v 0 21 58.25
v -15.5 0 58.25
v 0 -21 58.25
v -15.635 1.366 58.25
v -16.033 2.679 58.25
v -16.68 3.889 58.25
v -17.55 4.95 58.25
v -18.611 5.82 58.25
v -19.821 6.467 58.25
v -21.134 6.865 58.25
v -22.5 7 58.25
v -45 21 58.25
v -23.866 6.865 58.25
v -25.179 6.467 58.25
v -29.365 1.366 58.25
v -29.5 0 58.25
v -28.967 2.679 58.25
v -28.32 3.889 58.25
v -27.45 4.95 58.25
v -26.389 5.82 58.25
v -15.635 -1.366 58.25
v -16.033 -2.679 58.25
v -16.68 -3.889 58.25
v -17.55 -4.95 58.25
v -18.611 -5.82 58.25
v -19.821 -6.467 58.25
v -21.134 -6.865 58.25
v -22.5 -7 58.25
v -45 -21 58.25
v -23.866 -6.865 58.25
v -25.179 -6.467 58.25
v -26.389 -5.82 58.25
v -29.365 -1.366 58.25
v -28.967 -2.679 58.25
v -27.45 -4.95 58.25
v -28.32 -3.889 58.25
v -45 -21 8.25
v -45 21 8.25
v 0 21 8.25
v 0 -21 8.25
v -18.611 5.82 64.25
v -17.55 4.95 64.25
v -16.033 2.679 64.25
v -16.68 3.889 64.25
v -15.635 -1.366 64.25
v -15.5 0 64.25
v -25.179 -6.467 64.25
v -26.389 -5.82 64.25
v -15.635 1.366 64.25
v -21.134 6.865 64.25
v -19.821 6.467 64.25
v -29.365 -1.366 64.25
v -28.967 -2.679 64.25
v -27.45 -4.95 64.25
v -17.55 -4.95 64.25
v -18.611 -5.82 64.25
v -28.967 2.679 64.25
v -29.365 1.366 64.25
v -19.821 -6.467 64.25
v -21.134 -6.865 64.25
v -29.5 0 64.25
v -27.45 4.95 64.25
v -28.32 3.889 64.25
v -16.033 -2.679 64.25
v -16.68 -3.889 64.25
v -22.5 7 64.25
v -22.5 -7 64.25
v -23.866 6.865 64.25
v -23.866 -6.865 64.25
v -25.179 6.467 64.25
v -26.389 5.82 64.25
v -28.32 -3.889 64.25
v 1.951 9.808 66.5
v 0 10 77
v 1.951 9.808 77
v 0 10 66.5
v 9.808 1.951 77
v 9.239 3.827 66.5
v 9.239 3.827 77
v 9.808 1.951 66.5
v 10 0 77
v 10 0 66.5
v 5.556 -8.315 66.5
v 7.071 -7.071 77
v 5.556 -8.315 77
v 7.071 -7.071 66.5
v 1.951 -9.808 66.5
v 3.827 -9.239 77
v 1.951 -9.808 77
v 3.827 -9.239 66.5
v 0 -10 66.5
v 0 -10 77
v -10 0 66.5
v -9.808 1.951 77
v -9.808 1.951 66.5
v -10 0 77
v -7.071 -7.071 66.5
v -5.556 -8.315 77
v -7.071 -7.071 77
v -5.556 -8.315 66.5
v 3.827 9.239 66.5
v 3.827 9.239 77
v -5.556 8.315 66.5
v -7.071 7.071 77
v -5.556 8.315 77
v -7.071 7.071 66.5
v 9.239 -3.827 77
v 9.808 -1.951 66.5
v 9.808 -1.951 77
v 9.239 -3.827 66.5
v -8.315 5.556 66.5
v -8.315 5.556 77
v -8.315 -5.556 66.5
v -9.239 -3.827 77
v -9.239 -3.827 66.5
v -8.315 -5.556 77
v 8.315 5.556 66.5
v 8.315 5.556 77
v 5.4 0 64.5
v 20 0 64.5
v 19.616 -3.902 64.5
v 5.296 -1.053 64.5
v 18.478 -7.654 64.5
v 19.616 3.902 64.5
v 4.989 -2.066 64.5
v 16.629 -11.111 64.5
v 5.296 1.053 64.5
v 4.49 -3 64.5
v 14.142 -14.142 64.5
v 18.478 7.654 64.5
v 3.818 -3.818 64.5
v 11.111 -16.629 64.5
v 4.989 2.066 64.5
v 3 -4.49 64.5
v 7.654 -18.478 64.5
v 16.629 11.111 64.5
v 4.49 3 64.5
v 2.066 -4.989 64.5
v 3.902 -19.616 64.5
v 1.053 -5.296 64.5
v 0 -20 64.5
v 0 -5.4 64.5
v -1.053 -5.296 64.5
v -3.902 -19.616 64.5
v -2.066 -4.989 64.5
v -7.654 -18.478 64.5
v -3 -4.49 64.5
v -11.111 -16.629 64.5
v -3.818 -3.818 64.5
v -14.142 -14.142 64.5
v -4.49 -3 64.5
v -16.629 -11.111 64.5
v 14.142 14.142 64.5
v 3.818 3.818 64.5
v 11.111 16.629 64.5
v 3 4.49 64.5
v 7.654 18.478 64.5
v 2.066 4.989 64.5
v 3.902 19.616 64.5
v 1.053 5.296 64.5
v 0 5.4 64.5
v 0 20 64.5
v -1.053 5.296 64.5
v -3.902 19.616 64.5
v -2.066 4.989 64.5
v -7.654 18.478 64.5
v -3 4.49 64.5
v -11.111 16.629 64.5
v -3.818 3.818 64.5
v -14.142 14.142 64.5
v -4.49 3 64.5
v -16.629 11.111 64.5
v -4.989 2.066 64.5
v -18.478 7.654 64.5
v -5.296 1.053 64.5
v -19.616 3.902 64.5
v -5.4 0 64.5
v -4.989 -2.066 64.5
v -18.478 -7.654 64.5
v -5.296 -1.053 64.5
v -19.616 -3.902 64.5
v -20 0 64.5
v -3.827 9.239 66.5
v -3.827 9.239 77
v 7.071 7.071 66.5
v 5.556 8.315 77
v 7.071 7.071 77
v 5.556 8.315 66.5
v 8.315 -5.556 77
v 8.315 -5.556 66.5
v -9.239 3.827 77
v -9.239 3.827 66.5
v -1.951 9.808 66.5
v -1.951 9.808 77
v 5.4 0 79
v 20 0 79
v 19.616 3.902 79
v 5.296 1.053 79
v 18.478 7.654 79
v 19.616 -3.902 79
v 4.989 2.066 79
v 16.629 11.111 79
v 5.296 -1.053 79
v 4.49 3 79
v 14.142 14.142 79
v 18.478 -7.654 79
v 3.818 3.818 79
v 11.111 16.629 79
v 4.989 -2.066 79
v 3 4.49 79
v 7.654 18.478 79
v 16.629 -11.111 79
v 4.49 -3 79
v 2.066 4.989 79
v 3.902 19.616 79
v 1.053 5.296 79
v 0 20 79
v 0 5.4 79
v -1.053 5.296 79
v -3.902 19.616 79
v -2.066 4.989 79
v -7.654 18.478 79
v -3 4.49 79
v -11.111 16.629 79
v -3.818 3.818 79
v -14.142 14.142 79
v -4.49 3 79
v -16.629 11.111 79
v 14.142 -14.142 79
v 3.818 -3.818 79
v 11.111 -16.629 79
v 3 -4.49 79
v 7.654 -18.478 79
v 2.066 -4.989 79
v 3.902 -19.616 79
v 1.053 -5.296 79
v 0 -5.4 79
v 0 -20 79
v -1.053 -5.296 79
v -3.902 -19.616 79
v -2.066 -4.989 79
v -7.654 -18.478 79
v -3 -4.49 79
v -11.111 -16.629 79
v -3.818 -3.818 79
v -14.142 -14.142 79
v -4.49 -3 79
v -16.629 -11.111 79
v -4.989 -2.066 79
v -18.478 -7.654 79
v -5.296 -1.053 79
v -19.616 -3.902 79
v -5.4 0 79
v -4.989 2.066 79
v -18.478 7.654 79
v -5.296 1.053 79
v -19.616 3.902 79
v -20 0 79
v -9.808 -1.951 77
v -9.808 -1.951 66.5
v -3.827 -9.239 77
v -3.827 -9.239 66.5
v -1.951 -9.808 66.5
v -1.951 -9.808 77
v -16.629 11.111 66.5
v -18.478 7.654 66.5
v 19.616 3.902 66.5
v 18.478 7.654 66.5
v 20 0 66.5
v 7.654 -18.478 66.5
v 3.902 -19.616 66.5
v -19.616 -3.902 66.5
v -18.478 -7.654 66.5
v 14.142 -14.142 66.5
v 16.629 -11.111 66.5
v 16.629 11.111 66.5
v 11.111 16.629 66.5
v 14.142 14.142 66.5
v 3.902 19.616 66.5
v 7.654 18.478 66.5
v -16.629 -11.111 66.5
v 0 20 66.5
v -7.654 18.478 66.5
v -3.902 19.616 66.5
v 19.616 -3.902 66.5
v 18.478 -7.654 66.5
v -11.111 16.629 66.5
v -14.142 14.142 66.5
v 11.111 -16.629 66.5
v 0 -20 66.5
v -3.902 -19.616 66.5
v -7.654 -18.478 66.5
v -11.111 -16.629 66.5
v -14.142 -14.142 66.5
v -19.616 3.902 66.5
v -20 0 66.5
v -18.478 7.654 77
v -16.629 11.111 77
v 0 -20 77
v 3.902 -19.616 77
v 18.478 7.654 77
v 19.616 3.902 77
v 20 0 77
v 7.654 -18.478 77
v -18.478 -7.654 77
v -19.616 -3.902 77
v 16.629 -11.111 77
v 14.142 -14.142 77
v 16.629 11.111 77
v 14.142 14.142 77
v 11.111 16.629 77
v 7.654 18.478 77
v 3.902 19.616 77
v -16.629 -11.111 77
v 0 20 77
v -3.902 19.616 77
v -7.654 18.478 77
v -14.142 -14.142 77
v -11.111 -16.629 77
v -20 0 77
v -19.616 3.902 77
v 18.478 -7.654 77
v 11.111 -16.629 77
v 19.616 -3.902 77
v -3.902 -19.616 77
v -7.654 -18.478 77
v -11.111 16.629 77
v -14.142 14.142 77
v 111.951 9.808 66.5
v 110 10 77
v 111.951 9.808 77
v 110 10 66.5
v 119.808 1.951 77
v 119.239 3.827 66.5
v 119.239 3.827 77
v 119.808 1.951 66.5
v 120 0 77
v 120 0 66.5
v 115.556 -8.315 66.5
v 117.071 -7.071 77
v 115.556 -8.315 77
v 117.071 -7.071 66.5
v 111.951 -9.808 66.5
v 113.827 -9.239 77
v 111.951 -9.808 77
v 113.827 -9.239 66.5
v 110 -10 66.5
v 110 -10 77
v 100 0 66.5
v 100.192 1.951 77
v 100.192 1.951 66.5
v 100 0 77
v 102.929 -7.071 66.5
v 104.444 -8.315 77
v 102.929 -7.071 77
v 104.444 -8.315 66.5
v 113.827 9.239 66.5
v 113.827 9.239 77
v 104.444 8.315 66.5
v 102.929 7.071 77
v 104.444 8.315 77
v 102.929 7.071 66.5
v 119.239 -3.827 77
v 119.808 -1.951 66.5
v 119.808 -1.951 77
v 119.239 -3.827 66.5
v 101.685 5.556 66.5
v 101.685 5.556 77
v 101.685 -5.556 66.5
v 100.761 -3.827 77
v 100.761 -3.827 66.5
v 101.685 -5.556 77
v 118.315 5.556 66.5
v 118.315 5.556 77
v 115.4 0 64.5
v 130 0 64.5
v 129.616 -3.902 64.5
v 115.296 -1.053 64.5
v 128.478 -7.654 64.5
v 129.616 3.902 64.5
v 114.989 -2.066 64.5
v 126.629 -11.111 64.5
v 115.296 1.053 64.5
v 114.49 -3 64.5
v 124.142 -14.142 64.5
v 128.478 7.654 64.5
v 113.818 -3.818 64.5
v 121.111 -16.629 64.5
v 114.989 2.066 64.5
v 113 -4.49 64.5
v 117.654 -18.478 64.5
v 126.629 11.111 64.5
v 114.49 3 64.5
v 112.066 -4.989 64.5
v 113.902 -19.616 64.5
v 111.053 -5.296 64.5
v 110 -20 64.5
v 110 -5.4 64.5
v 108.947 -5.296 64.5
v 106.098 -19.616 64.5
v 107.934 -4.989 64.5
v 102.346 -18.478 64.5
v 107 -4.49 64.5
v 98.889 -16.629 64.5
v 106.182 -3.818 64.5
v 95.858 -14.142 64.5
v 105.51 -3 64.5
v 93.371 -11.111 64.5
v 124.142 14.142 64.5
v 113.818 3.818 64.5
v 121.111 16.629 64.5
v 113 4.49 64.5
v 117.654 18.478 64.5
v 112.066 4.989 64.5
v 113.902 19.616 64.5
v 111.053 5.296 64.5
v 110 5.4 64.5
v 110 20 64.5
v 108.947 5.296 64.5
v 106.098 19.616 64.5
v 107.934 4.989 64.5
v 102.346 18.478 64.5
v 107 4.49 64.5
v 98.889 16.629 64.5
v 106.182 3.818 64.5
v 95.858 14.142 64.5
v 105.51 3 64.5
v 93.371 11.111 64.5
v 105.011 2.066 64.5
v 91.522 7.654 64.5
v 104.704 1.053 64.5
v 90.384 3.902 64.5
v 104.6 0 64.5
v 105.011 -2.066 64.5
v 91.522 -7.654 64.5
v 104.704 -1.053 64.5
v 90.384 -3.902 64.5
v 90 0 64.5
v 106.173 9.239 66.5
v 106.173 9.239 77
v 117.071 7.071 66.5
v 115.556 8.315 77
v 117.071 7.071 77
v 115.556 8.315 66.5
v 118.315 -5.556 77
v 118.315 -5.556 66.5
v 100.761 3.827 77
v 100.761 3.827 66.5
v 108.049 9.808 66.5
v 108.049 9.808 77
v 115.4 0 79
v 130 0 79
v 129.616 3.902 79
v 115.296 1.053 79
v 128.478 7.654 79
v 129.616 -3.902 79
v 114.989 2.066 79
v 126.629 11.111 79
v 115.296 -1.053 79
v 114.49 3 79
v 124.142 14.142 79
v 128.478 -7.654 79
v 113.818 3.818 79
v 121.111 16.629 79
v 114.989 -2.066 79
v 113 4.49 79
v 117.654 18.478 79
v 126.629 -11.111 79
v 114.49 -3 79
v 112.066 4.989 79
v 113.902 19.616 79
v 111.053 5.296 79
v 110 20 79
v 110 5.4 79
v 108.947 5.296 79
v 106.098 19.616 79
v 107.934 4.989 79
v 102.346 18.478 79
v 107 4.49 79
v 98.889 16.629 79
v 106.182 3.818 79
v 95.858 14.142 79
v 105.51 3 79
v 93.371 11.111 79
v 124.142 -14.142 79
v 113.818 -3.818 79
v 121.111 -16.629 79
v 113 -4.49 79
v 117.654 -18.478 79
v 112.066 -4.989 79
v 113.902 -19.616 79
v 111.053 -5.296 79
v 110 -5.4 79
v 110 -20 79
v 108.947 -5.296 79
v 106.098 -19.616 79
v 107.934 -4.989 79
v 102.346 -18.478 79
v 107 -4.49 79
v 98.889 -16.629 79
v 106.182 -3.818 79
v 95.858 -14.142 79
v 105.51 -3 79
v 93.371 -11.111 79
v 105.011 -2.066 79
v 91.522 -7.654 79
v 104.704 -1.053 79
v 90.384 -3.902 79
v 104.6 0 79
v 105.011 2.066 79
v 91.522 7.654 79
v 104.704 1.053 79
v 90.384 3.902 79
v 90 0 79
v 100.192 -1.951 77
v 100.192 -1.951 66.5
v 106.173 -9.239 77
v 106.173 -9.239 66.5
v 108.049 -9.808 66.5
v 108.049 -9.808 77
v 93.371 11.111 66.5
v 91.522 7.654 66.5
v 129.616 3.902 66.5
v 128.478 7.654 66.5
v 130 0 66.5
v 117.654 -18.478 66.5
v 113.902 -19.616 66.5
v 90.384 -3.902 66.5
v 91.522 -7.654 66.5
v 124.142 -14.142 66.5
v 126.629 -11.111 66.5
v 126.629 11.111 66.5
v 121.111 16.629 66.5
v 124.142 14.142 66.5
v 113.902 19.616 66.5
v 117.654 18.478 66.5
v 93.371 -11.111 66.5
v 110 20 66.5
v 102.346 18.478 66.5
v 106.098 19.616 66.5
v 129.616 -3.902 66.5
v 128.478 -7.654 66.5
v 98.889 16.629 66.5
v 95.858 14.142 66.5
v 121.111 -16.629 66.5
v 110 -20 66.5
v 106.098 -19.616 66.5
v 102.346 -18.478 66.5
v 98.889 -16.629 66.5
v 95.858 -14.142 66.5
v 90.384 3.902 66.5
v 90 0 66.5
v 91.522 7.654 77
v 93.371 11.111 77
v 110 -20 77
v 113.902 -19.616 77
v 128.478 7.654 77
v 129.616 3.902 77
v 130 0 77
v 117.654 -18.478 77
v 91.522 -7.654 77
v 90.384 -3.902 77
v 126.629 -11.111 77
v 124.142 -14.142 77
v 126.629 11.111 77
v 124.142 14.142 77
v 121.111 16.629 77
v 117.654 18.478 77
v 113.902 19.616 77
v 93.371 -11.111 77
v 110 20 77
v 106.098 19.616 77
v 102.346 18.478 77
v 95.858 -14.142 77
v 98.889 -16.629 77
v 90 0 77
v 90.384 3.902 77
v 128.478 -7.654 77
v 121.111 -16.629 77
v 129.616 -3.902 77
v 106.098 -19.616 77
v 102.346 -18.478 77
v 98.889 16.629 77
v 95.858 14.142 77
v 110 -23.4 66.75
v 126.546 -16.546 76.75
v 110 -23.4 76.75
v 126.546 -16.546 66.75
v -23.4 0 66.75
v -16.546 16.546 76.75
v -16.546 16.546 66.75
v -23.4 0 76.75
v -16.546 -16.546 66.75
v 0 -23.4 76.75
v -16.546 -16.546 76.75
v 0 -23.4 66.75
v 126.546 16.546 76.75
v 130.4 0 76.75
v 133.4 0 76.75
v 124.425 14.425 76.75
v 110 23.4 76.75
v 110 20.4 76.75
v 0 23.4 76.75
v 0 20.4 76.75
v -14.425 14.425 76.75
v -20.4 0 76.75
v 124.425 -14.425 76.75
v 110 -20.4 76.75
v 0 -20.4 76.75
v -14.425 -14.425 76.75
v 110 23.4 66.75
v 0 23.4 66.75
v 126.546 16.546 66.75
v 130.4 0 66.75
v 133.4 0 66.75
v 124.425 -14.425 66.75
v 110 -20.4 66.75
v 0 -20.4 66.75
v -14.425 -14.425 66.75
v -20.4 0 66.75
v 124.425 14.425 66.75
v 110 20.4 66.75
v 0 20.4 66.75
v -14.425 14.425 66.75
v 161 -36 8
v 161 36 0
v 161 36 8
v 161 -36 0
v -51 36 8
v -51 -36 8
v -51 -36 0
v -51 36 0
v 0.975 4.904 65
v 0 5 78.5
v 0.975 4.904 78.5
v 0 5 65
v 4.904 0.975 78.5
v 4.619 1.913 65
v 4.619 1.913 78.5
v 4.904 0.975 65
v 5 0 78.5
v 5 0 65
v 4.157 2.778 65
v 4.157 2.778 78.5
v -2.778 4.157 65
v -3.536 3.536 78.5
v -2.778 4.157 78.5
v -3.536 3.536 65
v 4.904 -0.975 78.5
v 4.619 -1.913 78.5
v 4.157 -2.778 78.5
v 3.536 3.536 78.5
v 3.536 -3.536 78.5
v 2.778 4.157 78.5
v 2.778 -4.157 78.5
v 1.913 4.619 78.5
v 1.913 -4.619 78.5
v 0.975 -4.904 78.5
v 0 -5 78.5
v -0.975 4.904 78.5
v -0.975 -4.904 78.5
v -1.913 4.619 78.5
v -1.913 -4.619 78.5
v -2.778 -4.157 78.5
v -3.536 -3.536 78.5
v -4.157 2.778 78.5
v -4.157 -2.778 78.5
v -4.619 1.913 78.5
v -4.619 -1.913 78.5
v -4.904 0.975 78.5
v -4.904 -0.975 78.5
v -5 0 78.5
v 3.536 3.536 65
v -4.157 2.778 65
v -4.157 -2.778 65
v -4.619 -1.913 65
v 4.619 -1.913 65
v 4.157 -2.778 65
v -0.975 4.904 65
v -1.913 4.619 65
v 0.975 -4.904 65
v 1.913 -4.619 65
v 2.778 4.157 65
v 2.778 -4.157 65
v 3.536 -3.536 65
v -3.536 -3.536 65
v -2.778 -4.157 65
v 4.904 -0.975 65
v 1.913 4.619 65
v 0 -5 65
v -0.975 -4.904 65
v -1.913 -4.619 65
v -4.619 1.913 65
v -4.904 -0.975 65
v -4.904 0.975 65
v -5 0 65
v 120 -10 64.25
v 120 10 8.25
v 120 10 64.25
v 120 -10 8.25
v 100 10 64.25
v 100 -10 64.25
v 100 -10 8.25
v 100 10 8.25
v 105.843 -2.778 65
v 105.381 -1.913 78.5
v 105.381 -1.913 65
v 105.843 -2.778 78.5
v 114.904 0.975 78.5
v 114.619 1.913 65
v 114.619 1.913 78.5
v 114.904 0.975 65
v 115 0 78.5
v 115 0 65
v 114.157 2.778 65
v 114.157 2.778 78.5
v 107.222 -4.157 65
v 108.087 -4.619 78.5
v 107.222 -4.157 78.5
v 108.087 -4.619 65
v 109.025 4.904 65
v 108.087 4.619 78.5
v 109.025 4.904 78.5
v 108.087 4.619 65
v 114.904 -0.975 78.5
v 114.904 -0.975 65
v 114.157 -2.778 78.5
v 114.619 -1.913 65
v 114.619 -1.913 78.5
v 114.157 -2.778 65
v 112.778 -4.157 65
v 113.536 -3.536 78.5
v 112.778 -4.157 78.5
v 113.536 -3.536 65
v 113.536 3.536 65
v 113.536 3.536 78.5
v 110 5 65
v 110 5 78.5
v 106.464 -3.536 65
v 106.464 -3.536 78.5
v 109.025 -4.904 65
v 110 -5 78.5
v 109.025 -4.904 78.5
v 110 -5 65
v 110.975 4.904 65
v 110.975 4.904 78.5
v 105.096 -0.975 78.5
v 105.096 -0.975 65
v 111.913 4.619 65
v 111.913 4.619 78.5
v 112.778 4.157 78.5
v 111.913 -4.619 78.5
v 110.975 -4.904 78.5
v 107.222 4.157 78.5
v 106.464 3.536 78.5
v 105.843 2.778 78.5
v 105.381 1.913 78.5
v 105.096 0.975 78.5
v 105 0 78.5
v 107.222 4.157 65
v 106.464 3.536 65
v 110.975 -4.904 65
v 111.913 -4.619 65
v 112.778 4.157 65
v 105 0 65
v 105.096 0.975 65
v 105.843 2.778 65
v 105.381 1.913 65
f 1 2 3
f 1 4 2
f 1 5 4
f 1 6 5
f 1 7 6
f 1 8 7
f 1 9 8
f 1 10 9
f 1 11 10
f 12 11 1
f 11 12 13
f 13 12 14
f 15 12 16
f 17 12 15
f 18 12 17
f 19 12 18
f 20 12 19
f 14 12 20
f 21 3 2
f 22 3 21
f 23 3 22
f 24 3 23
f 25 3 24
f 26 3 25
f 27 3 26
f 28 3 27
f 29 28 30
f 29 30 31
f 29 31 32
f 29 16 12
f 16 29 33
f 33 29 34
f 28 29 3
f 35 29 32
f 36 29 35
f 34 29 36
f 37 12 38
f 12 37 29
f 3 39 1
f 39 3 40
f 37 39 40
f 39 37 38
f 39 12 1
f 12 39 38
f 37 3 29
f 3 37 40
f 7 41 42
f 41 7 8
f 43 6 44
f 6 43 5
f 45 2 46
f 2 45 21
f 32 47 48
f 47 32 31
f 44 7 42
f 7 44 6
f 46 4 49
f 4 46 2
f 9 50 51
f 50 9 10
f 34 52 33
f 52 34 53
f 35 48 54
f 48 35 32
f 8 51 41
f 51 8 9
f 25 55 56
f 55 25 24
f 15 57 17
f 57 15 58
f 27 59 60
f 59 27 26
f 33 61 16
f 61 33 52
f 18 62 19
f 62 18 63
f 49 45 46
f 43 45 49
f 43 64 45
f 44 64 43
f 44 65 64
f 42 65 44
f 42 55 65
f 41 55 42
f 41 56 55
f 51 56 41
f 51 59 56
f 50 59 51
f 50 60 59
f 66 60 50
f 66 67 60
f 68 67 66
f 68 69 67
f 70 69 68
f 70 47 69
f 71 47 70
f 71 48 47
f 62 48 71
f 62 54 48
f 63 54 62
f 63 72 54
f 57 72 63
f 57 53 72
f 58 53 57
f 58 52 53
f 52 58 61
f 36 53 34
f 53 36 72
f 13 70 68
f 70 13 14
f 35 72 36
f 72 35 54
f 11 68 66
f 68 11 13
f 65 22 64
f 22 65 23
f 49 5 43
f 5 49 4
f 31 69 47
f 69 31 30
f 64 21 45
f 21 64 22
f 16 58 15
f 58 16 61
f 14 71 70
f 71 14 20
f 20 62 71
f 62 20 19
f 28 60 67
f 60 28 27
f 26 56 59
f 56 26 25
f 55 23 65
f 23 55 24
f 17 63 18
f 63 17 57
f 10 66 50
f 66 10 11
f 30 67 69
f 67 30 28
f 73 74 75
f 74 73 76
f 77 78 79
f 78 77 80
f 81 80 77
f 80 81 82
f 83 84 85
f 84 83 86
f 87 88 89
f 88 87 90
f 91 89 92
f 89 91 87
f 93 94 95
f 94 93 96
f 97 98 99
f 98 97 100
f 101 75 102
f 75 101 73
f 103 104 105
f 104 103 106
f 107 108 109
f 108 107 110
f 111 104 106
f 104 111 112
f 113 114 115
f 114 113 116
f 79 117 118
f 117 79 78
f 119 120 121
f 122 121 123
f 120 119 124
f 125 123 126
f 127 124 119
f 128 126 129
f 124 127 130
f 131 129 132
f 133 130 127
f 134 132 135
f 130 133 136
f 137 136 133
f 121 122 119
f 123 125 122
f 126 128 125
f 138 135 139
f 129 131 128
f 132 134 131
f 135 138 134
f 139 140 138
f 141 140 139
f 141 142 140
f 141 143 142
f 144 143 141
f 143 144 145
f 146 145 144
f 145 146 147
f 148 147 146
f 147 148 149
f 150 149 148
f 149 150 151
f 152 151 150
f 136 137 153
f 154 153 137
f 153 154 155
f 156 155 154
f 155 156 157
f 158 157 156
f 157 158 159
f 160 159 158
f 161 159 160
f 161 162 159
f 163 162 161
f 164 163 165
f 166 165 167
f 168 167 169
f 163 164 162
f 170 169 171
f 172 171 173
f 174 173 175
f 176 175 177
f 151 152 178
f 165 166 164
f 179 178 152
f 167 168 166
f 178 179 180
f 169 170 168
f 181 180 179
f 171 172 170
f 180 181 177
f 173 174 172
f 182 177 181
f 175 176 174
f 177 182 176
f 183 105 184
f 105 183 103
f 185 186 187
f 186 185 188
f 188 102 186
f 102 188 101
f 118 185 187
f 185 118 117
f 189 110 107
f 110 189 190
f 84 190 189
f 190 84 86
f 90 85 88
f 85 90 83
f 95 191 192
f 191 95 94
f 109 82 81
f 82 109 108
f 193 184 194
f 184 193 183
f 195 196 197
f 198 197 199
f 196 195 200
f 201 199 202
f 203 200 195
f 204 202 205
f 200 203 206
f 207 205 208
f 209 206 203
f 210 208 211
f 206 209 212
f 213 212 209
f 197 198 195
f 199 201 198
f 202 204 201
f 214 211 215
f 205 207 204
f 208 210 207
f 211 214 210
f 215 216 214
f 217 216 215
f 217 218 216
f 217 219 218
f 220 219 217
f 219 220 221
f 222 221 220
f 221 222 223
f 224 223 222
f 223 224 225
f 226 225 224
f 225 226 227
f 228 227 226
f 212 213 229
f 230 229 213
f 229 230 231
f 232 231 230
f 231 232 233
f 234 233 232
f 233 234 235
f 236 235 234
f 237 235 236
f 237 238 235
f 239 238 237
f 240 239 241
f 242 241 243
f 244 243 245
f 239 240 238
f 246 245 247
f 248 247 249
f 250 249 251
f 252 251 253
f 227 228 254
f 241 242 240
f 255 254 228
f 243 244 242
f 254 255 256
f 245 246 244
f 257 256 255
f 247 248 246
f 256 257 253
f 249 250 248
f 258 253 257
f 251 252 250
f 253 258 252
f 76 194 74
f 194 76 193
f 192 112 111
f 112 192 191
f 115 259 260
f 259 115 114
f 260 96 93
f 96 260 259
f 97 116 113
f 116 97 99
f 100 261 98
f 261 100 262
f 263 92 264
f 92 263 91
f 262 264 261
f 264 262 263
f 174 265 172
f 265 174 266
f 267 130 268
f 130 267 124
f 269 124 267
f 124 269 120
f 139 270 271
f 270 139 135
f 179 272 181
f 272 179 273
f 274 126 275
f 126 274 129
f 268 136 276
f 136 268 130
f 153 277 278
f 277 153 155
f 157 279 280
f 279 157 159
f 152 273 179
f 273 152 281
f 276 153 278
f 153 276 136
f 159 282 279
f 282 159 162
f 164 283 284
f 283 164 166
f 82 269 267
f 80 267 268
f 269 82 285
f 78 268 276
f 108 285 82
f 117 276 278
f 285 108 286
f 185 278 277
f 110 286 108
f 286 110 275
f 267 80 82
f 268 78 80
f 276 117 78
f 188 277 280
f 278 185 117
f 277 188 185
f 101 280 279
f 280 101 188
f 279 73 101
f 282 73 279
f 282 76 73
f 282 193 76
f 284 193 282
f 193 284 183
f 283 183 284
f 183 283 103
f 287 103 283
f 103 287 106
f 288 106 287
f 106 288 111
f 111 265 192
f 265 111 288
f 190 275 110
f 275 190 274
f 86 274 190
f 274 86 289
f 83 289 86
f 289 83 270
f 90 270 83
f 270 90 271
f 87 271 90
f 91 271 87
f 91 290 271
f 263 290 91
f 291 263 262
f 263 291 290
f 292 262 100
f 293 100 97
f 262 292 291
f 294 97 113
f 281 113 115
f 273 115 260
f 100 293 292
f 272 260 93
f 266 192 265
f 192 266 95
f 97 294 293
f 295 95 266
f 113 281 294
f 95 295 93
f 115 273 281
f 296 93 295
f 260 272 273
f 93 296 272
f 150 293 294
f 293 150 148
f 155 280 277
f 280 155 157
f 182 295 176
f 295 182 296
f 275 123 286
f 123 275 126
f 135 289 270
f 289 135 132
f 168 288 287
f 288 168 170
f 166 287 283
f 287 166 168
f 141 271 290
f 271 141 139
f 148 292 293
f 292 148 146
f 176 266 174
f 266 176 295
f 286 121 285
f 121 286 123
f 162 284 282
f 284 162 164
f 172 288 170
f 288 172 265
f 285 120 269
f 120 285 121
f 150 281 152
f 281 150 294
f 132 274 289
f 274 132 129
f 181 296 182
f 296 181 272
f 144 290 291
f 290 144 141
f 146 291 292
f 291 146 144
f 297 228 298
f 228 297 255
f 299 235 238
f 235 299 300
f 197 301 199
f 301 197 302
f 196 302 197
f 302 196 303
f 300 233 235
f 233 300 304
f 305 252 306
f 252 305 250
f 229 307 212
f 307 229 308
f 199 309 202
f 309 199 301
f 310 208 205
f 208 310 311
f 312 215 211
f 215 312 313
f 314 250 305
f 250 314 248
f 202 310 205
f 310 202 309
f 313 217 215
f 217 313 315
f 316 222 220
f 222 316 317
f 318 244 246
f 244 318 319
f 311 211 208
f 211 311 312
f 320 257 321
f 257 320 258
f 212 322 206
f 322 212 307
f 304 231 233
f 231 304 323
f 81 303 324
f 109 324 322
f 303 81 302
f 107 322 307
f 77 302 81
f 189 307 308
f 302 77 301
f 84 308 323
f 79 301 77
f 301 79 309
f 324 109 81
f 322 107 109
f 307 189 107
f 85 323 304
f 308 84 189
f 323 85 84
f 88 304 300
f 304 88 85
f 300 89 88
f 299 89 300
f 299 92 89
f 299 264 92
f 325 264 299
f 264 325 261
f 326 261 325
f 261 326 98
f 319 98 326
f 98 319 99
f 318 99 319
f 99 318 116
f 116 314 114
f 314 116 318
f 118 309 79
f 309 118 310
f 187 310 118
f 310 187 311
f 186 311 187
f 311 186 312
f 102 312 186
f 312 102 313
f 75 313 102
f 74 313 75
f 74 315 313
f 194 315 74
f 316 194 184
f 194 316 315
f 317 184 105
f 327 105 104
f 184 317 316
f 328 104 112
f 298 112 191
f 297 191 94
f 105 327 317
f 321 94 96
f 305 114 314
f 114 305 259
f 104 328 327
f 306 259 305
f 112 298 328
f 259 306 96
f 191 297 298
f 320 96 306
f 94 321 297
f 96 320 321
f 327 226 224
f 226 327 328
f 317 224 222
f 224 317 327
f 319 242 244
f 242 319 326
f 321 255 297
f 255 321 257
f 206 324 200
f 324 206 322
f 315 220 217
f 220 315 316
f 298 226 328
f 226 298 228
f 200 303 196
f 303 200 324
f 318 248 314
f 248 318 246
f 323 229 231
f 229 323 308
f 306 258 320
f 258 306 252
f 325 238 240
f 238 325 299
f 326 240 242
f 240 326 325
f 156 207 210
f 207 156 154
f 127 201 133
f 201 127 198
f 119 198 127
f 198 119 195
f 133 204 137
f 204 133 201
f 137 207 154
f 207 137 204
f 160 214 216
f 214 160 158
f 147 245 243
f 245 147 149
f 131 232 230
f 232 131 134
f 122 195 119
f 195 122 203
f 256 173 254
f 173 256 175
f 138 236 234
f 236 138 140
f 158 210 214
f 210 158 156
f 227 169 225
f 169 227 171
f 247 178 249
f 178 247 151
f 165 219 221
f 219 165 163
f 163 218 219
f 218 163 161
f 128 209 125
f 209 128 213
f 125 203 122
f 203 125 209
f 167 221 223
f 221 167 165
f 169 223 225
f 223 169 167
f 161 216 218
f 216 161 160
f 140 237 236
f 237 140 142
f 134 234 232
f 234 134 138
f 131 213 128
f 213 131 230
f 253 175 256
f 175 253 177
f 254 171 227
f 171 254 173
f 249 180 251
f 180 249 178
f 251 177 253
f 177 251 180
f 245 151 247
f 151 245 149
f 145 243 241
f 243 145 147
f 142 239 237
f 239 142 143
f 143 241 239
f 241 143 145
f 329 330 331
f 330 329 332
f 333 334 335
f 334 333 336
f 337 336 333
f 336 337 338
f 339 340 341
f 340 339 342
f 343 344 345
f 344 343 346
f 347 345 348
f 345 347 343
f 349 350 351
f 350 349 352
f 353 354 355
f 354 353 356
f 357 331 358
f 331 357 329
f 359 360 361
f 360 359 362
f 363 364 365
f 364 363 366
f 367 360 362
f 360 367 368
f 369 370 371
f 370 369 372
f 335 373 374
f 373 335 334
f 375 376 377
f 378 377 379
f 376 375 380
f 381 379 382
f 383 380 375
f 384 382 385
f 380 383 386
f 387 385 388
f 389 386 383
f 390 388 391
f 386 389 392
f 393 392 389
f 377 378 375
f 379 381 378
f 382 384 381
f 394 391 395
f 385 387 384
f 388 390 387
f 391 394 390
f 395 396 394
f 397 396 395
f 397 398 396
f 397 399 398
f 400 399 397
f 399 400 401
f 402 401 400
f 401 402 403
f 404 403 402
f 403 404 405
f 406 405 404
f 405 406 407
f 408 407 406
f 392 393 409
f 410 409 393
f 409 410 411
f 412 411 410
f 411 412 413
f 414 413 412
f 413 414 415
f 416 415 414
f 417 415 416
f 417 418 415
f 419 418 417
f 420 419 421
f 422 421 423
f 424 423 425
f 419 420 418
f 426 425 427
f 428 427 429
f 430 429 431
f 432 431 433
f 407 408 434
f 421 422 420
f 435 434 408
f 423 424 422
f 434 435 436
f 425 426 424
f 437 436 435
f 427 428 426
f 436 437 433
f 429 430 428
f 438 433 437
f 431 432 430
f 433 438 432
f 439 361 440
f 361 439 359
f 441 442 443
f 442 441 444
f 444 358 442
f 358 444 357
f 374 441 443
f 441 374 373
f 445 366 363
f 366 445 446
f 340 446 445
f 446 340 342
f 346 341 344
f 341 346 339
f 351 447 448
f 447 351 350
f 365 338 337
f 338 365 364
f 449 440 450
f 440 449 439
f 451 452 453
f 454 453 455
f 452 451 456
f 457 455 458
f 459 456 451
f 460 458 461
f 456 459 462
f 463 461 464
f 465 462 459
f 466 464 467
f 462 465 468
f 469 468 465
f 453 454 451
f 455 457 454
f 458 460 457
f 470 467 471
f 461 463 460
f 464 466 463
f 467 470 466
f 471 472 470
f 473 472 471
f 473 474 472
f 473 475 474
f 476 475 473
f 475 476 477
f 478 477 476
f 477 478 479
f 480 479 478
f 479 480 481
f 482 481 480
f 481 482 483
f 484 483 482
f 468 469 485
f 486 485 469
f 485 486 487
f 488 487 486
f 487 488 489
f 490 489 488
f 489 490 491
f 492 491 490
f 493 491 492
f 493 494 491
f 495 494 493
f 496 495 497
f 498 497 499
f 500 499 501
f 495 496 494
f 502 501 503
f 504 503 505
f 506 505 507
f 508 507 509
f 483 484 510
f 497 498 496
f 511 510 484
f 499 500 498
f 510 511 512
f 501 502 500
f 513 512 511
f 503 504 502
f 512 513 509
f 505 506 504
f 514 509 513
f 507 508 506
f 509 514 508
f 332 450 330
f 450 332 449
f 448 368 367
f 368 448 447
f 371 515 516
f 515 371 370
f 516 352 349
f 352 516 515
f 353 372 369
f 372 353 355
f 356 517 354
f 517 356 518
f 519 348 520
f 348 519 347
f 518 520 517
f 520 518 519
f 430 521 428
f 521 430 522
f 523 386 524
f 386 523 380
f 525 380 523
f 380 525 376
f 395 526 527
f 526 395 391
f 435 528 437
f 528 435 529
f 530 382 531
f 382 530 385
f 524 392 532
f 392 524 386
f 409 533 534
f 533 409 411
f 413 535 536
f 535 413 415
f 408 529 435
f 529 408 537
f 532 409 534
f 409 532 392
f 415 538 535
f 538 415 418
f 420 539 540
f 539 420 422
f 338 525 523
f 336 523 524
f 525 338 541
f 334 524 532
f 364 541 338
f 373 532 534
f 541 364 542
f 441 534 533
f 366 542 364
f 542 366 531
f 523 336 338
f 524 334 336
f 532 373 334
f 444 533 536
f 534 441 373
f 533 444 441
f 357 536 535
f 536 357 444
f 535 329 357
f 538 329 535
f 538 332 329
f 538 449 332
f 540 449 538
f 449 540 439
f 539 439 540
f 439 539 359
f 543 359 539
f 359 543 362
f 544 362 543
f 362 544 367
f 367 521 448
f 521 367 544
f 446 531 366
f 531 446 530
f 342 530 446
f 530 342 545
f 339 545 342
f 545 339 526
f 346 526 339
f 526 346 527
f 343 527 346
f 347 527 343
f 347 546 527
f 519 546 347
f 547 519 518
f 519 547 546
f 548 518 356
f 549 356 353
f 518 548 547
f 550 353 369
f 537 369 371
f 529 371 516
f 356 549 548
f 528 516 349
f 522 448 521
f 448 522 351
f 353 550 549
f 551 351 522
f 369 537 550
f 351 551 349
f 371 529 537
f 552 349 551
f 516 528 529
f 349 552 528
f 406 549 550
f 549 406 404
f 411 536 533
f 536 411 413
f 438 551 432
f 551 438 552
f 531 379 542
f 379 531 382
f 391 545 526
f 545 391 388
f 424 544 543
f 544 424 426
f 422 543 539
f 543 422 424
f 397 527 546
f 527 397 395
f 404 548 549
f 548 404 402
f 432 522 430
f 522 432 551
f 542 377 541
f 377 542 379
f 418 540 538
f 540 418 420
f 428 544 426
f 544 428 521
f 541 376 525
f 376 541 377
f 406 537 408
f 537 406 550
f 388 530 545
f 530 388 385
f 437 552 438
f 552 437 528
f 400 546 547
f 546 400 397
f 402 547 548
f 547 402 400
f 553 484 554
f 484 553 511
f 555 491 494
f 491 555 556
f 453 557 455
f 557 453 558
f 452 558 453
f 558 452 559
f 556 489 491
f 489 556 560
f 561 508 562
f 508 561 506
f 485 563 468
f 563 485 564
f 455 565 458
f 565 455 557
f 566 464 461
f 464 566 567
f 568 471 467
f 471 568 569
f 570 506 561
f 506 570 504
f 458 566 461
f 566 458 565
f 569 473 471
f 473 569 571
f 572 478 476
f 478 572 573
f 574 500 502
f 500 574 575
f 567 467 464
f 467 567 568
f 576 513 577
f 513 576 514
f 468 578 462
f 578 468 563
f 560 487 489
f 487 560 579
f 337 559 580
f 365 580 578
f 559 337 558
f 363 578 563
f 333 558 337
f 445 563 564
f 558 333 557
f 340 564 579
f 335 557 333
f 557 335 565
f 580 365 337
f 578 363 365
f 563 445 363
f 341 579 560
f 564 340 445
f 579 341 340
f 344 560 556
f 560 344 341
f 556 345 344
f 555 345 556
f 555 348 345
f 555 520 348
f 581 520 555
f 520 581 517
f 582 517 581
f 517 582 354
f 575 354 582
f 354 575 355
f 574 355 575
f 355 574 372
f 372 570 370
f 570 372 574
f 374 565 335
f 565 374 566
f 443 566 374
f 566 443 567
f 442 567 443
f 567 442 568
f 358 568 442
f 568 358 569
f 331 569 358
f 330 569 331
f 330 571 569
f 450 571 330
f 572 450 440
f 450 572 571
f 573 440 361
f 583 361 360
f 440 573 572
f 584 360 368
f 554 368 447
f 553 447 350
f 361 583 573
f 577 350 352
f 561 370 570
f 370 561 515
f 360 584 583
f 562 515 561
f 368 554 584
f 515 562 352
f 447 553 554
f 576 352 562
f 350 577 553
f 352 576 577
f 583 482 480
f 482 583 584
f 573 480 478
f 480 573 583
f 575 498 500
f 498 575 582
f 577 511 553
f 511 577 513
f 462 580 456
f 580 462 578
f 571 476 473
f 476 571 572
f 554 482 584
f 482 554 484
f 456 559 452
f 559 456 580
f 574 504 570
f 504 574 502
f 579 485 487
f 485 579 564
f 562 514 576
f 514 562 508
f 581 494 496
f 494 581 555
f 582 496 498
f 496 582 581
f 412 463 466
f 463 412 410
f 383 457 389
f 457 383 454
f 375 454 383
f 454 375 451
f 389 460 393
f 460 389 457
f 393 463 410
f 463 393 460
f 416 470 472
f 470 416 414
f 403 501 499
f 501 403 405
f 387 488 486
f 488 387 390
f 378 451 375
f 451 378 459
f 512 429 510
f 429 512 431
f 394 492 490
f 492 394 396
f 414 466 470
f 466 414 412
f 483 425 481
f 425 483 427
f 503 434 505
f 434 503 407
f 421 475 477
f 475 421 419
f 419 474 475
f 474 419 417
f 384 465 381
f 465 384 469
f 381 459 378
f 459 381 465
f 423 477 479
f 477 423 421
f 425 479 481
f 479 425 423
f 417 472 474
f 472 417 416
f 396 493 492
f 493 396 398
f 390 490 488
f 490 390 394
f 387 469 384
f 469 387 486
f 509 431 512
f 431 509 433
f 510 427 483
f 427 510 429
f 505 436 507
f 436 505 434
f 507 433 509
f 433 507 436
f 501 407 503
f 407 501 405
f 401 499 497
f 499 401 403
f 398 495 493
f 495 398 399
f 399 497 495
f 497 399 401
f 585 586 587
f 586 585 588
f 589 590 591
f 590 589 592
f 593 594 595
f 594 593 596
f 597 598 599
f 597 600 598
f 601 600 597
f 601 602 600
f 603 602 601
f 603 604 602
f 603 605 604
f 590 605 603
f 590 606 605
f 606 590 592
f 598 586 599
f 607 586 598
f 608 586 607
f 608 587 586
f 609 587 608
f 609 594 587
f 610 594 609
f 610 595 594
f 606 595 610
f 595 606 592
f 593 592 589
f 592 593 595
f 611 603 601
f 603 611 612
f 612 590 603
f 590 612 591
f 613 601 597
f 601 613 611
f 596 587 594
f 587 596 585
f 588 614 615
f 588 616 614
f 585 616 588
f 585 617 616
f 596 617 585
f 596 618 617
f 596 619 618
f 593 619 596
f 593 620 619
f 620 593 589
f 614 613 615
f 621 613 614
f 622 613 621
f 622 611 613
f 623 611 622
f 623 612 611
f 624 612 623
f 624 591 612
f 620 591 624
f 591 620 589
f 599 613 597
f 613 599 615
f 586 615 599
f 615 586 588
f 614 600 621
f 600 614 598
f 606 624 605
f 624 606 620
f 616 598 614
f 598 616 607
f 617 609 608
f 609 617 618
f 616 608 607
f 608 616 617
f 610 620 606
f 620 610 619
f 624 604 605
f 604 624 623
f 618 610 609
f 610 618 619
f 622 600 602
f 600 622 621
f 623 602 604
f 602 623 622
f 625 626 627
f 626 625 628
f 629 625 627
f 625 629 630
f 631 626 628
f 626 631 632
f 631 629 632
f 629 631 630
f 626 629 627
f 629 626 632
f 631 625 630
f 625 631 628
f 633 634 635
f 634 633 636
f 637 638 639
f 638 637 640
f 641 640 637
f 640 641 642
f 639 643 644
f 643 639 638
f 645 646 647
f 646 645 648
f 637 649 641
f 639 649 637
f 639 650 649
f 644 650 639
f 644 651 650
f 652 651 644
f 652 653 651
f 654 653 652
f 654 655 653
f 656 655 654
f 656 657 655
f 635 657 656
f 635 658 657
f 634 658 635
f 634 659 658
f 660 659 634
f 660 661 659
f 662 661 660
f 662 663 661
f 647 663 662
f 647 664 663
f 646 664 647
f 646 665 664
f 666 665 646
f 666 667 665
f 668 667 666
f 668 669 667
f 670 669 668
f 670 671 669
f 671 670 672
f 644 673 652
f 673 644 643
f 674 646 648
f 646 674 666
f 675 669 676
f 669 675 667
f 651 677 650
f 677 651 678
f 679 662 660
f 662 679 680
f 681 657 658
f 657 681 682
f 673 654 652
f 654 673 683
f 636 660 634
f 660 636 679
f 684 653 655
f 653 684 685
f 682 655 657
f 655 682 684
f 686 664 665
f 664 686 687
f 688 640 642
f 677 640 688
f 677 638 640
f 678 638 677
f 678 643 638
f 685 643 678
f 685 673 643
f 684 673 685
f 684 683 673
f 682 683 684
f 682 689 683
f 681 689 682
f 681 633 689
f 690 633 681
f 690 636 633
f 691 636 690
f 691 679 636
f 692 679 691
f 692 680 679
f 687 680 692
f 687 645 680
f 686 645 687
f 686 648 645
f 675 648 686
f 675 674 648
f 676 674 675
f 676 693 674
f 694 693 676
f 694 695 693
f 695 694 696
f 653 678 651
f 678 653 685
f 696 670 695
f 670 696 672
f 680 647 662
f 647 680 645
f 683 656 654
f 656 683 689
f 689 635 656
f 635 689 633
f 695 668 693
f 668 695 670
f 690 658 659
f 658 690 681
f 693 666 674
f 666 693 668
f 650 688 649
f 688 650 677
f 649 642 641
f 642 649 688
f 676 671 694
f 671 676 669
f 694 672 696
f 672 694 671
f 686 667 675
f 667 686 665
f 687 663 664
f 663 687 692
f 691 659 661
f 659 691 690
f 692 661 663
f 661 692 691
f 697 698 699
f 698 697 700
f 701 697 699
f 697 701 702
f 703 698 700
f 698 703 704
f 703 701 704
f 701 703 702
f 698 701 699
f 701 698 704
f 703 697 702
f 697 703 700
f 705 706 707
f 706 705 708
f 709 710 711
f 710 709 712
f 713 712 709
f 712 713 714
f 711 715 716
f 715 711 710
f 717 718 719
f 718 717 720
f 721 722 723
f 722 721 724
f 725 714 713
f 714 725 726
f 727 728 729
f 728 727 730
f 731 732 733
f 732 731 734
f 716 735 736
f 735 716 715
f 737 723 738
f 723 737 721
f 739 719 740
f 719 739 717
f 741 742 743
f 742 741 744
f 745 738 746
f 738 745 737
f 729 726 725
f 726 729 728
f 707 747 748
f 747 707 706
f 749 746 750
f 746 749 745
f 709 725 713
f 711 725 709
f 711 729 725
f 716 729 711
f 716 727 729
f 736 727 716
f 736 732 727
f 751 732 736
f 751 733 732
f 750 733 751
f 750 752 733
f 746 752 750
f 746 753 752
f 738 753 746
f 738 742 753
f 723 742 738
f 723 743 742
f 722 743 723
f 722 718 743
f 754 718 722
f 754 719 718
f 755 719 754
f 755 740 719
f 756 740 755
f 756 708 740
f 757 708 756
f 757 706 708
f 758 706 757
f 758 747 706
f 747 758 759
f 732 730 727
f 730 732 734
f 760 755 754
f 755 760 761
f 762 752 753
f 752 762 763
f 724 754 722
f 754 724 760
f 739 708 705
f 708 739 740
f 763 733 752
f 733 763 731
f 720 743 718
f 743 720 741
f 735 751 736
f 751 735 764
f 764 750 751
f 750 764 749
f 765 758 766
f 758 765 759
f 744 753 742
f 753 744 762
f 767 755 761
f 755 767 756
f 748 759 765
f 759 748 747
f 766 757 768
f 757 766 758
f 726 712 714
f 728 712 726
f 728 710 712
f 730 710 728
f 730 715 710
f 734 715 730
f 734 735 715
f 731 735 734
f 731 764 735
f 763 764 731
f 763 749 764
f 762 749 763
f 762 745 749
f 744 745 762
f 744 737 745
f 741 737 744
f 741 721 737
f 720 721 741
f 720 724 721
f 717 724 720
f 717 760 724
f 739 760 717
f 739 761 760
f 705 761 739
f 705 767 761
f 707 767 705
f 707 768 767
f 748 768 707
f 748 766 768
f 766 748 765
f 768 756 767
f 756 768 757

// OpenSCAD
$fn = 32;

// ------------------------------------------------------------------------
// Motor belt drive: span 110 mm, pulleys d40, belt 10 mm wide
// Every part is its own module, assembly() places every instance.
// ------------------------------------------------------------------------

// --- part 1 ---
module base_plate() {
  difference() {
    translate([-106, -36, 0]) cube([212, 72, 8]);
  }
}

// --- part 2 ---
module motor() {
  union() {
    translate([-25, -21, 0]) cube([50, 42, 45]);
    translate([28, 0, 22.5]) rotate([0, 90, 0]) cylinder(h = 6, d = 14, center = true);
  }
}

// --- part 3 ---
module drive_shaft() {
  translate([0, 0, -6.75]) cylinder(h = 13.5, d = 10);
}

// --- part 4 ---
module pulley_drive() {
  difference() {
    union() {
      cylinder(h = 14.5, d = 20);
      cylinder(h = 2, d = 40);
      translate([0, 0, 12.5]) cylinder(h = 2, d = 40);
    }
    translate([0, 0, -1]) cylinder(h = 16.5, d = 10.8);
  }
}

// --- part 5 ---
module idler_post() {
  translate([-10, -10, 0]) cube([20, 20, 56]);
}

// --- part 6 ---
module driven_shaft() {
  translate([0, 0, -6.75]) cylinder(h = 13.5, d = 10);
}

// --- part 7 ---
module pulley_driven() {
  difference() {
    union() {
      cylinder(h = 14.5, d = 20);
      cylinder(h = 2, d = 40);
      translate([0, 0, 12.5]) cylinder(h = 2, d = 40);
    }
    translate([0, 0, -1]) cylinder(h = 16.5, d = 10.8);
  }
}

// --- part 8 ---
module drive_belt() {
  difference() {
    linear_extrude(height = 10) polygon(points = concat([for (a = [90 : 45 : 270]) [23.4 * cos(a), 23.4 * sin(a)]], [for (a = [270 : 45 : 450]) [110 + 23.4 * cos(a), 23.4 * sin(a)]]));
    translate([0, 0, -1]) linear_extrude(height = 12) polygon(points = concat([for (a = [90 : 45 : 270]) [20.4 * cos(a), 20.4 * sin(a)]], [for (a = [270 : 45 : 450]) [110 + 20.4 * cos(a), 20.4 * sin(a)]]));
  }
}

// --- assembly ---
module assembly() {
  color([0.80, 0.24, 0.20]) translate([55, 0, 0]) rotate([0, 0, 0]) base_plate();
  color([0.20, 0.45, 0.75]) translate([0, 0, 33.25]) rotate([0, 270, 0]) motor();
  color([0.25, 0.62, 0.32]) translate([0, 0, 71.75]) rotate([0, 0, 0]) drive_shaft();
  color([0.92, 0.70, 0.18]) translate([0, 0, 64.5]) rotate([0, 0, 0]) pulley_drive();
  color([0.58, 0.35, 0.70]) translate([110, 0, 8.25]) rotate([0, 0, 0]) idler_post();
  color([0.16, 0.66, 0.66]) translate([110, 0, 71.75]) rotate([0, 0, 0]) driven_shaft();
  color([0.85, 0.48, 0.18]) translate([110, 0, 64.5]) rotate([0, 0, 0]) pulley_driven();
  color([0.55, 0.60, 0.65]) translate([0, 0, 66.75]) rotate([0, 0, 0]) drive_belt();
}

assembly();
